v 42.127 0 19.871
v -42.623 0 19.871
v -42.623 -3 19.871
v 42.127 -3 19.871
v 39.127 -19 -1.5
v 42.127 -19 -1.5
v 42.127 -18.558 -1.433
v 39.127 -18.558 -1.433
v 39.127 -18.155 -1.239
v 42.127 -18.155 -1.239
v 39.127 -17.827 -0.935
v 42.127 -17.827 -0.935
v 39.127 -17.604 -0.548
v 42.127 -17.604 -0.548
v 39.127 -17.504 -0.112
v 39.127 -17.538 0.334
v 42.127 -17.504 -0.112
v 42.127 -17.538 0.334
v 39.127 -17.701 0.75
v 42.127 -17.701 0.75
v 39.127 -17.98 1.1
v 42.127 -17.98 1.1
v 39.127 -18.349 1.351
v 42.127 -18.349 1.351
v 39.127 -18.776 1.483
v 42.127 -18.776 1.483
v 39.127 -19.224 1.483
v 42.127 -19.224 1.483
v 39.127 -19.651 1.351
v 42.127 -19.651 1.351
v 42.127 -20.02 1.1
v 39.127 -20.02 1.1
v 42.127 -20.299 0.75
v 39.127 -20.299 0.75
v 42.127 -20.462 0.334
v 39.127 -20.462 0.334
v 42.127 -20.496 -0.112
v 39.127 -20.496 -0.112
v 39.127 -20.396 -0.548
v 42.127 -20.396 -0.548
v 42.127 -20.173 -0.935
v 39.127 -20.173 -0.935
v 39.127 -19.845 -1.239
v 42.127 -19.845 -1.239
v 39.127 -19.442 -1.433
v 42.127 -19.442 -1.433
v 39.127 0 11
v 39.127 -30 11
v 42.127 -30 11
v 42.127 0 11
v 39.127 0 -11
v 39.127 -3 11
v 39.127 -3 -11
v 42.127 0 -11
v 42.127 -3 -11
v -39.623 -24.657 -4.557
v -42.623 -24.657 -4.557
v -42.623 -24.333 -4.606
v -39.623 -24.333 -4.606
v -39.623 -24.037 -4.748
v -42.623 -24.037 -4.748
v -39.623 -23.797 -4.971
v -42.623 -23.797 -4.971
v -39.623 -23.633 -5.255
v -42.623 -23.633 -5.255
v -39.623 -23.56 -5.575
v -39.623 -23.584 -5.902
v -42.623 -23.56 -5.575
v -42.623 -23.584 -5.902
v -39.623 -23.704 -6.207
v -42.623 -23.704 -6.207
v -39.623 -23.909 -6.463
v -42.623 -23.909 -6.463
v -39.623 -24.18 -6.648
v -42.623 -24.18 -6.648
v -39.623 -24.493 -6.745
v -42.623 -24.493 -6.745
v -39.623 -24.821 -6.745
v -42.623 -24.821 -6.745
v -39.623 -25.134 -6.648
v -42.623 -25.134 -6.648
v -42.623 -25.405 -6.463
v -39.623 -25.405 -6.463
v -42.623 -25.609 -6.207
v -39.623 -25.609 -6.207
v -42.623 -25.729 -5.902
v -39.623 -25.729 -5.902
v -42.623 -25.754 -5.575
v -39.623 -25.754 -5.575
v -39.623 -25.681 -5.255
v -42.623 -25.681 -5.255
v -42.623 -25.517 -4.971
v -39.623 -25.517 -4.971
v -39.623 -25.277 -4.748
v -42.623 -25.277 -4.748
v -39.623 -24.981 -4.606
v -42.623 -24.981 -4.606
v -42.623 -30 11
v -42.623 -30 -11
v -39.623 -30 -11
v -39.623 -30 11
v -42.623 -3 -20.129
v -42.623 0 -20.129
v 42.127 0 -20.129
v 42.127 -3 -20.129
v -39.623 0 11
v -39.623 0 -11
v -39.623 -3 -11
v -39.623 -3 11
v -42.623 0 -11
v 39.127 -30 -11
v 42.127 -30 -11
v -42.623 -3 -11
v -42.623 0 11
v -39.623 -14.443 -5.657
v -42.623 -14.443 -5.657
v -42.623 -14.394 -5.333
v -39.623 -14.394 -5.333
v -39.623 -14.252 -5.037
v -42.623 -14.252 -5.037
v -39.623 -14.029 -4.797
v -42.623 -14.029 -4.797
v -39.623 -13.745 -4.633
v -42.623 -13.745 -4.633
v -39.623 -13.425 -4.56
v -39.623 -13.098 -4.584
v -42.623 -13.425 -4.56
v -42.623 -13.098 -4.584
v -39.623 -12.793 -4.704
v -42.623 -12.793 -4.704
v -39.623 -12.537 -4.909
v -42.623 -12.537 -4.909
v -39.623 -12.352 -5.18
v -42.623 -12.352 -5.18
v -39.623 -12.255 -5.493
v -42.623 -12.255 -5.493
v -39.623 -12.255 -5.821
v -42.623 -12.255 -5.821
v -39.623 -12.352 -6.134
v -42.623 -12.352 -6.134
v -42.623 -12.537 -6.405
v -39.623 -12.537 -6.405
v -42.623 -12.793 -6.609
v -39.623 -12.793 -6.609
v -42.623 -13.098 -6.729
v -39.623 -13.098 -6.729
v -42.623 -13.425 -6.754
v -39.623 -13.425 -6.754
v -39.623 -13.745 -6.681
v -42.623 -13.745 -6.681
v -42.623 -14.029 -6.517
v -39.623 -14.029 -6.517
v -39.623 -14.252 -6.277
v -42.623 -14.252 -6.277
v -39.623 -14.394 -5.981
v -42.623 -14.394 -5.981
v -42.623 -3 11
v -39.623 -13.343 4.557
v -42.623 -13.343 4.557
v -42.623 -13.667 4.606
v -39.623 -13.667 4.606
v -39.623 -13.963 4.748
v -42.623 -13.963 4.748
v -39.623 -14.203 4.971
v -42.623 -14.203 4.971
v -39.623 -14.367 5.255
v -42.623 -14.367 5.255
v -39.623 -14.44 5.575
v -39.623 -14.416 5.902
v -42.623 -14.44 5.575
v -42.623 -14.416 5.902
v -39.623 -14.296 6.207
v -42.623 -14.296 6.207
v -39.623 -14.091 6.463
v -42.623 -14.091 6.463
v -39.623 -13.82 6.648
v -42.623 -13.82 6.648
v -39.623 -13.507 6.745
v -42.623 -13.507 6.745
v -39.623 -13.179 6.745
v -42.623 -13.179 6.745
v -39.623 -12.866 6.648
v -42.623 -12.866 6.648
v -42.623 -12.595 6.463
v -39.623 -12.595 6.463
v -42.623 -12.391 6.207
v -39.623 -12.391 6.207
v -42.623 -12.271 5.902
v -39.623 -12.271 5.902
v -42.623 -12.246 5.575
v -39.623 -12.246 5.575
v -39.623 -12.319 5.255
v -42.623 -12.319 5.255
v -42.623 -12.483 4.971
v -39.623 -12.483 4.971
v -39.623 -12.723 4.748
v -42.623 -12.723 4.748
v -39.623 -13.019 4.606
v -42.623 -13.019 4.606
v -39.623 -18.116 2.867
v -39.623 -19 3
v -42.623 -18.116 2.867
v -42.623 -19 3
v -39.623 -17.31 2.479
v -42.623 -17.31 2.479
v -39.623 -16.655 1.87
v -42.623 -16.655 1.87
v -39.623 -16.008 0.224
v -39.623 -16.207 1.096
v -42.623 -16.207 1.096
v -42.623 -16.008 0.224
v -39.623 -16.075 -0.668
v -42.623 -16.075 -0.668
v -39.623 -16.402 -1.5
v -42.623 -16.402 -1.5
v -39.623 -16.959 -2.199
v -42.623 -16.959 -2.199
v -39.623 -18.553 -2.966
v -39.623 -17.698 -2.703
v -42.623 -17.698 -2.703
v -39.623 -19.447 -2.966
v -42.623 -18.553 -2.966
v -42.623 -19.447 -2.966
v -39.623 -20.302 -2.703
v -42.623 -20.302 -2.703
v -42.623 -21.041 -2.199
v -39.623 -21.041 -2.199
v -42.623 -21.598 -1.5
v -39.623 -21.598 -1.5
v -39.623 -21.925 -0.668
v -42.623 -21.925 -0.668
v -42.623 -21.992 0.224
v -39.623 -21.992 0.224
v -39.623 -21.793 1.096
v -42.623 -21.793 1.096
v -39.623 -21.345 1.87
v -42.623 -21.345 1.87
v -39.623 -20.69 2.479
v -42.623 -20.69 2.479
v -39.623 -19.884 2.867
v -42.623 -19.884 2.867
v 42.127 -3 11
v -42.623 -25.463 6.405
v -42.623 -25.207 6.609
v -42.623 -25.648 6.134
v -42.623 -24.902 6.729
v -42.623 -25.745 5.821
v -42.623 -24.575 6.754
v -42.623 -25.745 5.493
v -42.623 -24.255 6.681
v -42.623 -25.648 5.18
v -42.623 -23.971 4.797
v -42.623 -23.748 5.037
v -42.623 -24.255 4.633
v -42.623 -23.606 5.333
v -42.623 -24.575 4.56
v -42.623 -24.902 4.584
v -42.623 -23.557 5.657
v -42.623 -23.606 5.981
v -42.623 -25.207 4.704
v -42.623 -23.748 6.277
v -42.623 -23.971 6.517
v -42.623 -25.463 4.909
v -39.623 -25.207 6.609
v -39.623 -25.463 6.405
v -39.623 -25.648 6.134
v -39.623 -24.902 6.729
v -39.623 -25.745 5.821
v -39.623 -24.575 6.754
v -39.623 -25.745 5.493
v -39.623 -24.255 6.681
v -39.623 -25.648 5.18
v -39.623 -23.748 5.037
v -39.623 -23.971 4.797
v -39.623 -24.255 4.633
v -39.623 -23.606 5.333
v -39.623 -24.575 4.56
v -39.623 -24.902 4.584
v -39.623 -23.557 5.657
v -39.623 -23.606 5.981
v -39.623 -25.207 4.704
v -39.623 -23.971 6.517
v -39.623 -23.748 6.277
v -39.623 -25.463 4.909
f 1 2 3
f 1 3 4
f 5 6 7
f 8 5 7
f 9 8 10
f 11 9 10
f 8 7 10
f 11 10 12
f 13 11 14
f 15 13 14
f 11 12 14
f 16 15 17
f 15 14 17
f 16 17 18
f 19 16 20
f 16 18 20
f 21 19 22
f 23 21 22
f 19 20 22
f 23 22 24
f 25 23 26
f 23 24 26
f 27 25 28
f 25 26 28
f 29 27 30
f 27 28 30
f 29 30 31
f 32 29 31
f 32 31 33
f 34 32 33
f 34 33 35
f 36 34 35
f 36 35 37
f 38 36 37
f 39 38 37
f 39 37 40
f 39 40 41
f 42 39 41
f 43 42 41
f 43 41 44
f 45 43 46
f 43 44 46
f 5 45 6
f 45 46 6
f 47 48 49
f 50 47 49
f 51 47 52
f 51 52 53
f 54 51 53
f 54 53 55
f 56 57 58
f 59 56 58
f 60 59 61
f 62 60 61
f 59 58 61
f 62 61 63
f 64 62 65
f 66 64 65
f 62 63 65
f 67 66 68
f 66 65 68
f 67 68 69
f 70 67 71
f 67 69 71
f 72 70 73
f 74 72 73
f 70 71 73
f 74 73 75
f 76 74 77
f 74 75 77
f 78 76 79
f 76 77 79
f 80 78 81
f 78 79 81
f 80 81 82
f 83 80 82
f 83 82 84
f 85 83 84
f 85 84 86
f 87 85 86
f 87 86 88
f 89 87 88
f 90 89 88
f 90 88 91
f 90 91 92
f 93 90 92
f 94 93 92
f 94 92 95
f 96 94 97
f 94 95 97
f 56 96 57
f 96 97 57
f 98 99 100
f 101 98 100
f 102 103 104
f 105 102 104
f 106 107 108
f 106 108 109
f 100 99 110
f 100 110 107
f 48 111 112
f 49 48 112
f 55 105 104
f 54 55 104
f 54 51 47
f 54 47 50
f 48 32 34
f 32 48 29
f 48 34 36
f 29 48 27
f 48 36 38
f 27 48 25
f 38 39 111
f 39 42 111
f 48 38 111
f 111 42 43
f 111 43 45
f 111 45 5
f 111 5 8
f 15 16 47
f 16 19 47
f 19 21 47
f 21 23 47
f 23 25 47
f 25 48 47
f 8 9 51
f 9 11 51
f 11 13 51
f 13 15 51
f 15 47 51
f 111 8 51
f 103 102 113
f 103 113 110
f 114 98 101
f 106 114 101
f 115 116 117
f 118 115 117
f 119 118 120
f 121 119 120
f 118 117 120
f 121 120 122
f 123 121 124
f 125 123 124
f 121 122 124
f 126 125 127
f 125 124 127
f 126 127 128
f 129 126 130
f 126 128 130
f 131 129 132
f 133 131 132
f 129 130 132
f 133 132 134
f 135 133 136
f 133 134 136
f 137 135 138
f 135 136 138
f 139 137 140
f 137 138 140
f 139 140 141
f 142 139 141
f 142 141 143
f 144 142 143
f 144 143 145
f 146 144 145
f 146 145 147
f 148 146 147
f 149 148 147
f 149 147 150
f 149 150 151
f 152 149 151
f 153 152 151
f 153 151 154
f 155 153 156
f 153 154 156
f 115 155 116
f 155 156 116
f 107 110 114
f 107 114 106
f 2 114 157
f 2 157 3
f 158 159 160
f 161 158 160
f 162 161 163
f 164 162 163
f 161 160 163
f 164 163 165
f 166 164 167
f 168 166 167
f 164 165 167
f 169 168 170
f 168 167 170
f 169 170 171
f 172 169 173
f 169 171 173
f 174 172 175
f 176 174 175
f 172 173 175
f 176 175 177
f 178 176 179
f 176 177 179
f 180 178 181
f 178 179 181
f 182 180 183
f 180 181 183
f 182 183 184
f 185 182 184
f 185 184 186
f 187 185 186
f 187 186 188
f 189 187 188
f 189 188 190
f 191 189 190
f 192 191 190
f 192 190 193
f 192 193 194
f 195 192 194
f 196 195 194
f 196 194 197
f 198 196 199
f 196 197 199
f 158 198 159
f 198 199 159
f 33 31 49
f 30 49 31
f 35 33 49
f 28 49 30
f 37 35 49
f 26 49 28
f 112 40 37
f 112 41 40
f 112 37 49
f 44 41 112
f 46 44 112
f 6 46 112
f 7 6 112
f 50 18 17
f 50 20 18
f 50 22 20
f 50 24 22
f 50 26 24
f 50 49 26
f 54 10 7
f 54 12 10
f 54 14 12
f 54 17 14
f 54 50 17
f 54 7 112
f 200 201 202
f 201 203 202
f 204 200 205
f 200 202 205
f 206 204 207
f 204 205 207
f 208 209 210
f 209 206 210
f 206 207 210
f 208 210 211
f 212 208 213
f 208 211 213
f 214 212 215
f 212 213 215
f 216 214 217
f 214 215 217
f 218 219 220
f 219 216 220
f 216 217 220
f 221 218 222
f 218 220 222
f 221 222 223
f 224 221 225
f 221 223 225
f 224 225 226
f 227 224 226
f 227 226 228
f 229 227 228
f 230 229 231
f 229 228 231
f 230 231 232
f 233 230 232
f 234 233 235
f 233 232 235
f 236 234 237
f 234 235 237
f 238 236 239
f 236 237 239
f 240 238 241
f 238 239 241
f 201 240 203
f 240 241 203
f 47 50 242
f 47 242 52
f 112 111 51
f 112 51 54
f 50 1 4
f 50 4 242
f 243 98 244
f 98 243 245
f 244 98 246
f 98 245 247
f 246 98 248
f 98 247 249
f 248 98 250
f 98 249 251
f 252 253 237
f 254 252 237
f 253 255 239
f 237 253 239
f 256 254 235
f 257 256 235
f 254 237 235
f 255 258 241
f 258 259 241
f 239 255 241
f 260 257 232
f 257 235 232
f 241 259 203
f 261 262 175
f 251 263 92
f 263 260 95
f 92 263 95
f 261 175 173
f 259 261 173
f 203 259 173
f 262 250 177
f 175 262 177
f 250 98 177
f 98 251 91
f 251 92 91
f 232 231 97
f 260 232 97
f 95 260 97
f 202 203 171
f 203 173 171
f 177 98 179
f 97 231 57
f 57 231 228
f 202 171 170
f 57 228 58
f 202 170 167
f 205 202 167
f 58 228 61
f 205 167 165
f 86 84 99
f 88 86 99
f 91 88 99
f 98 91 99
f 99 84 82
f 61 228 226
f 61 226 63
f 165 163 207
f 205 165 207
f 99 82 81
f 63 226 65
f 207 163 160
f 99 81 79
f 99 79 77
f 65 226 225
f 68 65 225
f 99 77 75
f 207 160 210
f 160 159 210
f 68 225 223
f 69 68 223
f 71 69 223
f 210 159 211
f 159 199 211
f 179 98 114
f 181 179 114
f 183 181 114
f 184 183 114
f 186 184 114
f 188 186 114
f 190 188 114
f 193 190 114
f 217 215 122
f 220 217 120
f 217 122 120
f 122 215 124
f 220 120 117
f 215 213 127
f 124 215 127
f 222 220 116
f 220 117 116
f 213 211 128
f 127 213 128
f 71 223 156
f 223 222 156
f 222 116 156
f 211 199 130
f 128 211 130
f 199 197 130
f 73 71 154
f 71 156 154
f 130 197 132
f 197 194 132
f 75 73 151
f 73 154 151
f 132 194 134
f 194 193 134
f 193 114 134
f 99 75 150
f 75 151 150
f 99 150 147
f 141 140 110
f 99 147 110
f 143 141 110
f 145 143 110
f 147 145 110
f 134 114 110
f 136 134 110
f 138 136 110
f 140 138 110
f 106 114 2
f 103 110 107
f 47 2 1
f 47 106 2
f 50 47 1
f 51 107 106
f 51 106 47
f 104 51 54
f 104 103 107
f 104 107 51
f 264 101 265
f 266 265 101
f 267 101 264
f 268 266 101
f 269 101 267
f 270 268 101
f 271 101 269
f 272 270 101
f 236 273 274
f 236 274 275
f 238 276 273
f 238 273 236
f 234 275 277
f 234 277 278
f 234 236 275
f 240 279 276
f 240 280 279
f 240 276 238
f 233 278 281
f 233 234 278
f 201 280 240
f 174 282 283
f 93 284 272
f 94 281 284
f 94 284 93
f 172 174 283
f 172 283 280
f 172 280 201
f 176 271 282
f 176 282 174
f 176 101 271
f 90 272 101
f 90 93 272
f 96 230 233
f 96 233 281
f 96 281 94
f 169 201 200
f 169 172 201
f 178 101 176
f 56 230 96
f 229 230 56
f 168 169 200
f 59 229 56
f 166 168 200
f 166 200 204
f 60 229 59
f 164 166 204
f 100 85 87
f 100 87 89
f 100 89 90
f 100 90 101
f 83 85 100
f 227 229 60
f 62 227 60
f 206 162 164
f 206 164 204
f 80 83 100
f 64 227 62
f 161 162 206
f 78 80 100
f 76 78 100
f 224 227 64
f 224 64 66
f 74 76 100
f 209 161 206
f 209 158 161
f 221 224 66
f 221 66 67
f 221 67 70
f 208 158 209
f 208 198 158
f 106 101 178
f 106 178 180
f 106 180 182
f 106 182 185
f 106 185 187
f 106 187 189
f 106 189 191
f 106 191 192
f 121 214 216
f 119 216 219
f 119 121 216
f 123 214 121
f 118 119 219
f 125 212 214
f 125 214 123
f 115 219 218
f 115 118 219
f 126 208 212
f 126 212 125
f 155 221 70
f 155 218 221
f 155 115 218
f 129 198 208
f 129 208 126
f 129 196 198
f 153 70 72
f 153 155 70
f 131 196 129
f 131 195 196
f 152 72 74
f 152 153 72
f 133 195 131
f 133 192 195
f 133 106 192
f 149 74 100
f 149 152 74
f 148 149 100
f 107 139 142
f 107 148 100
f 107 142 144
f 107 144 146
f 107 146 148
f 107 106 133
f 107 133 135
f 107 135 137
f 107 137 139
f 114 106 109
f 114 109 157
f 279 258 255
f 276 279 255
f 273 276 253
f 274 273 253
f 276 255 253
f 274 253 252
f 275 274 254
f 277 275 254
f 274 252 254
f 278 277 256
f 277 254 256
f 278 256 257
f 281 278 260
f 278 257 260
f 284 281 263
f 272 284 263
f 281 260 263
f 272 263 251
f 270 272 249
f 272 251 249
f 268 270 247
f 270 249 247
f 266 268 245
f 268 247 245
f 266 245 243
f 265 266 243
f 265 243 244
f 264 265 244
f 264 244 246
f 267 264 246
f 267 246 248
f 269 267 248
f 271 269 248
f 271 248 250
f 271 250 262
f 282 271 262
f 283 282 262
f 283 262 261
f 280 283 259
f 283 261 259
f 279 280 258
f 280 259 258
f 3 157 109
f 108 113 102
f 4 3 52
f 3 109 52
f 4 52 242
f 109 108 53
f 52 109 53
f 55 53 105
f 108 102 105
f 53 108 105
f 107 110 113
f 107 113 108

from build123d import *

# Parameters (mm, degrees)
BOSS_EXTRUDE1_DEPTH         = 3
SKETCH1_3_W                 = 3
SKETCH1_3_H                 = 22
BOSS_EXTRUDE2_DEPTH         = 30
BOSS_EXTRUDE2_2_DEPTH       = 30
SKETCH2_R                   = 3
SKETCH2_R_2                 = 1.1
CUT_EXTRUDE1_DEPTH          = 3
SKETCH3_R                   = 1.5
CUT_EXTRUDE2_DEPTH          = 3
CIRPATTERN1_COUNT           = 4
BODY_MOVE_COPY1_START       = 19.870550162
BODY_MOVE_COPY1_OUTLINE_W   = 84.75
BODY_MOVE_COPY1_OUTLINE_H   = 3
BODY_MOVE_COPY1_DEPTH       = 0.258899676
BODY_MOVE_COPY1_START_2     = -20.129449838
BODY_MOVE_COPY1_2_OUTLINE_W = 84.75
BODY_MOVE_COPY1_2_OUTLINE_H = 3
BODY_MOVE_COPY1_2_DEPTH     = 0.258899676


# Read off the part's stored shape, not the designer's step: Body-Move/Copy1
with BuildPart() as part:
    # Sketch1 → Boss-Extrude1 (new body)
    with BuildSketch(Plane(origin=(0, 0, 0), x_dir=(1, 0, 0), z_dir=(0, 1, 0))):
        Polygon((42.126618123, 19.870550162), (-42.623381877, 19.870550162), (-42.623381877, 11), (-39.623381877, 11), (-39.623381877, -11), (-42.623381877, -11), (-42.623381877, -20.129449838), (42.126618123, -20.129449838), (42.126618123, -11), (39.126618123, -11), (39.126618123, 11), (42.126618123, 11), align=None)
    extrude(amount=-BOSS_EXTRUDE1_DEPTH)

    # Body-Move/Copy1 outline → Body-Move/Copy1 (cut)
    with BuildSketch(Plane.XY.offset(BODY_MOVE_COPY1_START)):
        with Locations((-0.248381877, -1.5)):
            Rectangle(BODY_MOVE_COPY1_OUTLINE_W, BODY_MOVE_COPY1_OUTLINE_H)
    extrude(amount=BODY_MOVE_COPY1_DEPTH, mode=Mode.SUBTRACT)

    # Body-Move_Copy1 2 outline → Body-Move_Copy1 2 (add)
    with BuildSketch(Plane.XY.offset(BODY_MOVE_COPY1_START_2)):
        with Locations((-0.248381877, -1.5)):
            Rectangle(BODY_MOVE_COPY1_2_OUTLINE_W, BODY_MOVE_COPY1_2_OUTLINE_H)
    extrude(amount=BODY_MOVE_COPY1_2_DEPTH)


with BuildPart() as body_2:
    # Sketch1<3> → Boss-Extrude2 (new body)
    with BuildSketch(Plane(origin=(0, 0, 0), x_dir=(1, 0, 0), z_dir=(0, 1, 0))):
        with Locations((-41.123381877, 0)):
            Rectangle(SKETCH1_3_W, SKETCH1_3_H)
    extrude(amount=-BOSS_EXTRUDE2_DEPTH)

    # Sketch2 → Cut-Extrude1 (cut)
    with BuildSketch(Plane.ZY.offset(42.623381877)):
        with Locations((0, -19)):
            Circle(SKETCH2_R)
        with Locations((-5.656854249, -24.656854249)):
            Circle(SKETCH2_R_2)
    cut_extrude1 = extrude(amount=-CUT_EXTRUDE1_DEPTH, mode=Mode.SUBTRACT)

    # CirPattern1: Cut-Extrude1 ×4 about axis
    cirpattern1_axis = Axis((0, -19, 0), (1, 0, 0))
    for i in range(1, CIRPATTERN1_COUNT):
        add(cut_extrude1.rotate(cirpattern1_axis, i * 360 / CIRPATTERN1_COUNT), mode=Mode.SUBTRACT)


with BuildPart() as body_3:
    # Sketch1<3> → Boss-Extrude2 2 (new body)
    with BuildSketch(Plane(origin=(0, 0, 0), x_dir=(1, 0, 0), z_dir=(0, 1, 0))):
        with Locations((40.626618123, 0)):
            Rectangle(SKETCH1_3_W, SKETCH1_3_H)
    extrude(amount=-BOSS_EXTRUDE2_2_DEPTH)

    # Sketch3 → Cut-Extrude2 (cut)
    with BuildSketch(Plane(origin=(42.126618123, 0, 0), x_dir=(0, 0, -1), z_dir=(1, 0, 0))):
        with Locations((0, -19)):
            Circle(SKETCH3_R)
    extrude(amount=-CUT_EXTRUDE2_DEPTH, mode=Mode.SUBTRACT)


solid = Compound([part.part, body_2.part, body_3.part])
